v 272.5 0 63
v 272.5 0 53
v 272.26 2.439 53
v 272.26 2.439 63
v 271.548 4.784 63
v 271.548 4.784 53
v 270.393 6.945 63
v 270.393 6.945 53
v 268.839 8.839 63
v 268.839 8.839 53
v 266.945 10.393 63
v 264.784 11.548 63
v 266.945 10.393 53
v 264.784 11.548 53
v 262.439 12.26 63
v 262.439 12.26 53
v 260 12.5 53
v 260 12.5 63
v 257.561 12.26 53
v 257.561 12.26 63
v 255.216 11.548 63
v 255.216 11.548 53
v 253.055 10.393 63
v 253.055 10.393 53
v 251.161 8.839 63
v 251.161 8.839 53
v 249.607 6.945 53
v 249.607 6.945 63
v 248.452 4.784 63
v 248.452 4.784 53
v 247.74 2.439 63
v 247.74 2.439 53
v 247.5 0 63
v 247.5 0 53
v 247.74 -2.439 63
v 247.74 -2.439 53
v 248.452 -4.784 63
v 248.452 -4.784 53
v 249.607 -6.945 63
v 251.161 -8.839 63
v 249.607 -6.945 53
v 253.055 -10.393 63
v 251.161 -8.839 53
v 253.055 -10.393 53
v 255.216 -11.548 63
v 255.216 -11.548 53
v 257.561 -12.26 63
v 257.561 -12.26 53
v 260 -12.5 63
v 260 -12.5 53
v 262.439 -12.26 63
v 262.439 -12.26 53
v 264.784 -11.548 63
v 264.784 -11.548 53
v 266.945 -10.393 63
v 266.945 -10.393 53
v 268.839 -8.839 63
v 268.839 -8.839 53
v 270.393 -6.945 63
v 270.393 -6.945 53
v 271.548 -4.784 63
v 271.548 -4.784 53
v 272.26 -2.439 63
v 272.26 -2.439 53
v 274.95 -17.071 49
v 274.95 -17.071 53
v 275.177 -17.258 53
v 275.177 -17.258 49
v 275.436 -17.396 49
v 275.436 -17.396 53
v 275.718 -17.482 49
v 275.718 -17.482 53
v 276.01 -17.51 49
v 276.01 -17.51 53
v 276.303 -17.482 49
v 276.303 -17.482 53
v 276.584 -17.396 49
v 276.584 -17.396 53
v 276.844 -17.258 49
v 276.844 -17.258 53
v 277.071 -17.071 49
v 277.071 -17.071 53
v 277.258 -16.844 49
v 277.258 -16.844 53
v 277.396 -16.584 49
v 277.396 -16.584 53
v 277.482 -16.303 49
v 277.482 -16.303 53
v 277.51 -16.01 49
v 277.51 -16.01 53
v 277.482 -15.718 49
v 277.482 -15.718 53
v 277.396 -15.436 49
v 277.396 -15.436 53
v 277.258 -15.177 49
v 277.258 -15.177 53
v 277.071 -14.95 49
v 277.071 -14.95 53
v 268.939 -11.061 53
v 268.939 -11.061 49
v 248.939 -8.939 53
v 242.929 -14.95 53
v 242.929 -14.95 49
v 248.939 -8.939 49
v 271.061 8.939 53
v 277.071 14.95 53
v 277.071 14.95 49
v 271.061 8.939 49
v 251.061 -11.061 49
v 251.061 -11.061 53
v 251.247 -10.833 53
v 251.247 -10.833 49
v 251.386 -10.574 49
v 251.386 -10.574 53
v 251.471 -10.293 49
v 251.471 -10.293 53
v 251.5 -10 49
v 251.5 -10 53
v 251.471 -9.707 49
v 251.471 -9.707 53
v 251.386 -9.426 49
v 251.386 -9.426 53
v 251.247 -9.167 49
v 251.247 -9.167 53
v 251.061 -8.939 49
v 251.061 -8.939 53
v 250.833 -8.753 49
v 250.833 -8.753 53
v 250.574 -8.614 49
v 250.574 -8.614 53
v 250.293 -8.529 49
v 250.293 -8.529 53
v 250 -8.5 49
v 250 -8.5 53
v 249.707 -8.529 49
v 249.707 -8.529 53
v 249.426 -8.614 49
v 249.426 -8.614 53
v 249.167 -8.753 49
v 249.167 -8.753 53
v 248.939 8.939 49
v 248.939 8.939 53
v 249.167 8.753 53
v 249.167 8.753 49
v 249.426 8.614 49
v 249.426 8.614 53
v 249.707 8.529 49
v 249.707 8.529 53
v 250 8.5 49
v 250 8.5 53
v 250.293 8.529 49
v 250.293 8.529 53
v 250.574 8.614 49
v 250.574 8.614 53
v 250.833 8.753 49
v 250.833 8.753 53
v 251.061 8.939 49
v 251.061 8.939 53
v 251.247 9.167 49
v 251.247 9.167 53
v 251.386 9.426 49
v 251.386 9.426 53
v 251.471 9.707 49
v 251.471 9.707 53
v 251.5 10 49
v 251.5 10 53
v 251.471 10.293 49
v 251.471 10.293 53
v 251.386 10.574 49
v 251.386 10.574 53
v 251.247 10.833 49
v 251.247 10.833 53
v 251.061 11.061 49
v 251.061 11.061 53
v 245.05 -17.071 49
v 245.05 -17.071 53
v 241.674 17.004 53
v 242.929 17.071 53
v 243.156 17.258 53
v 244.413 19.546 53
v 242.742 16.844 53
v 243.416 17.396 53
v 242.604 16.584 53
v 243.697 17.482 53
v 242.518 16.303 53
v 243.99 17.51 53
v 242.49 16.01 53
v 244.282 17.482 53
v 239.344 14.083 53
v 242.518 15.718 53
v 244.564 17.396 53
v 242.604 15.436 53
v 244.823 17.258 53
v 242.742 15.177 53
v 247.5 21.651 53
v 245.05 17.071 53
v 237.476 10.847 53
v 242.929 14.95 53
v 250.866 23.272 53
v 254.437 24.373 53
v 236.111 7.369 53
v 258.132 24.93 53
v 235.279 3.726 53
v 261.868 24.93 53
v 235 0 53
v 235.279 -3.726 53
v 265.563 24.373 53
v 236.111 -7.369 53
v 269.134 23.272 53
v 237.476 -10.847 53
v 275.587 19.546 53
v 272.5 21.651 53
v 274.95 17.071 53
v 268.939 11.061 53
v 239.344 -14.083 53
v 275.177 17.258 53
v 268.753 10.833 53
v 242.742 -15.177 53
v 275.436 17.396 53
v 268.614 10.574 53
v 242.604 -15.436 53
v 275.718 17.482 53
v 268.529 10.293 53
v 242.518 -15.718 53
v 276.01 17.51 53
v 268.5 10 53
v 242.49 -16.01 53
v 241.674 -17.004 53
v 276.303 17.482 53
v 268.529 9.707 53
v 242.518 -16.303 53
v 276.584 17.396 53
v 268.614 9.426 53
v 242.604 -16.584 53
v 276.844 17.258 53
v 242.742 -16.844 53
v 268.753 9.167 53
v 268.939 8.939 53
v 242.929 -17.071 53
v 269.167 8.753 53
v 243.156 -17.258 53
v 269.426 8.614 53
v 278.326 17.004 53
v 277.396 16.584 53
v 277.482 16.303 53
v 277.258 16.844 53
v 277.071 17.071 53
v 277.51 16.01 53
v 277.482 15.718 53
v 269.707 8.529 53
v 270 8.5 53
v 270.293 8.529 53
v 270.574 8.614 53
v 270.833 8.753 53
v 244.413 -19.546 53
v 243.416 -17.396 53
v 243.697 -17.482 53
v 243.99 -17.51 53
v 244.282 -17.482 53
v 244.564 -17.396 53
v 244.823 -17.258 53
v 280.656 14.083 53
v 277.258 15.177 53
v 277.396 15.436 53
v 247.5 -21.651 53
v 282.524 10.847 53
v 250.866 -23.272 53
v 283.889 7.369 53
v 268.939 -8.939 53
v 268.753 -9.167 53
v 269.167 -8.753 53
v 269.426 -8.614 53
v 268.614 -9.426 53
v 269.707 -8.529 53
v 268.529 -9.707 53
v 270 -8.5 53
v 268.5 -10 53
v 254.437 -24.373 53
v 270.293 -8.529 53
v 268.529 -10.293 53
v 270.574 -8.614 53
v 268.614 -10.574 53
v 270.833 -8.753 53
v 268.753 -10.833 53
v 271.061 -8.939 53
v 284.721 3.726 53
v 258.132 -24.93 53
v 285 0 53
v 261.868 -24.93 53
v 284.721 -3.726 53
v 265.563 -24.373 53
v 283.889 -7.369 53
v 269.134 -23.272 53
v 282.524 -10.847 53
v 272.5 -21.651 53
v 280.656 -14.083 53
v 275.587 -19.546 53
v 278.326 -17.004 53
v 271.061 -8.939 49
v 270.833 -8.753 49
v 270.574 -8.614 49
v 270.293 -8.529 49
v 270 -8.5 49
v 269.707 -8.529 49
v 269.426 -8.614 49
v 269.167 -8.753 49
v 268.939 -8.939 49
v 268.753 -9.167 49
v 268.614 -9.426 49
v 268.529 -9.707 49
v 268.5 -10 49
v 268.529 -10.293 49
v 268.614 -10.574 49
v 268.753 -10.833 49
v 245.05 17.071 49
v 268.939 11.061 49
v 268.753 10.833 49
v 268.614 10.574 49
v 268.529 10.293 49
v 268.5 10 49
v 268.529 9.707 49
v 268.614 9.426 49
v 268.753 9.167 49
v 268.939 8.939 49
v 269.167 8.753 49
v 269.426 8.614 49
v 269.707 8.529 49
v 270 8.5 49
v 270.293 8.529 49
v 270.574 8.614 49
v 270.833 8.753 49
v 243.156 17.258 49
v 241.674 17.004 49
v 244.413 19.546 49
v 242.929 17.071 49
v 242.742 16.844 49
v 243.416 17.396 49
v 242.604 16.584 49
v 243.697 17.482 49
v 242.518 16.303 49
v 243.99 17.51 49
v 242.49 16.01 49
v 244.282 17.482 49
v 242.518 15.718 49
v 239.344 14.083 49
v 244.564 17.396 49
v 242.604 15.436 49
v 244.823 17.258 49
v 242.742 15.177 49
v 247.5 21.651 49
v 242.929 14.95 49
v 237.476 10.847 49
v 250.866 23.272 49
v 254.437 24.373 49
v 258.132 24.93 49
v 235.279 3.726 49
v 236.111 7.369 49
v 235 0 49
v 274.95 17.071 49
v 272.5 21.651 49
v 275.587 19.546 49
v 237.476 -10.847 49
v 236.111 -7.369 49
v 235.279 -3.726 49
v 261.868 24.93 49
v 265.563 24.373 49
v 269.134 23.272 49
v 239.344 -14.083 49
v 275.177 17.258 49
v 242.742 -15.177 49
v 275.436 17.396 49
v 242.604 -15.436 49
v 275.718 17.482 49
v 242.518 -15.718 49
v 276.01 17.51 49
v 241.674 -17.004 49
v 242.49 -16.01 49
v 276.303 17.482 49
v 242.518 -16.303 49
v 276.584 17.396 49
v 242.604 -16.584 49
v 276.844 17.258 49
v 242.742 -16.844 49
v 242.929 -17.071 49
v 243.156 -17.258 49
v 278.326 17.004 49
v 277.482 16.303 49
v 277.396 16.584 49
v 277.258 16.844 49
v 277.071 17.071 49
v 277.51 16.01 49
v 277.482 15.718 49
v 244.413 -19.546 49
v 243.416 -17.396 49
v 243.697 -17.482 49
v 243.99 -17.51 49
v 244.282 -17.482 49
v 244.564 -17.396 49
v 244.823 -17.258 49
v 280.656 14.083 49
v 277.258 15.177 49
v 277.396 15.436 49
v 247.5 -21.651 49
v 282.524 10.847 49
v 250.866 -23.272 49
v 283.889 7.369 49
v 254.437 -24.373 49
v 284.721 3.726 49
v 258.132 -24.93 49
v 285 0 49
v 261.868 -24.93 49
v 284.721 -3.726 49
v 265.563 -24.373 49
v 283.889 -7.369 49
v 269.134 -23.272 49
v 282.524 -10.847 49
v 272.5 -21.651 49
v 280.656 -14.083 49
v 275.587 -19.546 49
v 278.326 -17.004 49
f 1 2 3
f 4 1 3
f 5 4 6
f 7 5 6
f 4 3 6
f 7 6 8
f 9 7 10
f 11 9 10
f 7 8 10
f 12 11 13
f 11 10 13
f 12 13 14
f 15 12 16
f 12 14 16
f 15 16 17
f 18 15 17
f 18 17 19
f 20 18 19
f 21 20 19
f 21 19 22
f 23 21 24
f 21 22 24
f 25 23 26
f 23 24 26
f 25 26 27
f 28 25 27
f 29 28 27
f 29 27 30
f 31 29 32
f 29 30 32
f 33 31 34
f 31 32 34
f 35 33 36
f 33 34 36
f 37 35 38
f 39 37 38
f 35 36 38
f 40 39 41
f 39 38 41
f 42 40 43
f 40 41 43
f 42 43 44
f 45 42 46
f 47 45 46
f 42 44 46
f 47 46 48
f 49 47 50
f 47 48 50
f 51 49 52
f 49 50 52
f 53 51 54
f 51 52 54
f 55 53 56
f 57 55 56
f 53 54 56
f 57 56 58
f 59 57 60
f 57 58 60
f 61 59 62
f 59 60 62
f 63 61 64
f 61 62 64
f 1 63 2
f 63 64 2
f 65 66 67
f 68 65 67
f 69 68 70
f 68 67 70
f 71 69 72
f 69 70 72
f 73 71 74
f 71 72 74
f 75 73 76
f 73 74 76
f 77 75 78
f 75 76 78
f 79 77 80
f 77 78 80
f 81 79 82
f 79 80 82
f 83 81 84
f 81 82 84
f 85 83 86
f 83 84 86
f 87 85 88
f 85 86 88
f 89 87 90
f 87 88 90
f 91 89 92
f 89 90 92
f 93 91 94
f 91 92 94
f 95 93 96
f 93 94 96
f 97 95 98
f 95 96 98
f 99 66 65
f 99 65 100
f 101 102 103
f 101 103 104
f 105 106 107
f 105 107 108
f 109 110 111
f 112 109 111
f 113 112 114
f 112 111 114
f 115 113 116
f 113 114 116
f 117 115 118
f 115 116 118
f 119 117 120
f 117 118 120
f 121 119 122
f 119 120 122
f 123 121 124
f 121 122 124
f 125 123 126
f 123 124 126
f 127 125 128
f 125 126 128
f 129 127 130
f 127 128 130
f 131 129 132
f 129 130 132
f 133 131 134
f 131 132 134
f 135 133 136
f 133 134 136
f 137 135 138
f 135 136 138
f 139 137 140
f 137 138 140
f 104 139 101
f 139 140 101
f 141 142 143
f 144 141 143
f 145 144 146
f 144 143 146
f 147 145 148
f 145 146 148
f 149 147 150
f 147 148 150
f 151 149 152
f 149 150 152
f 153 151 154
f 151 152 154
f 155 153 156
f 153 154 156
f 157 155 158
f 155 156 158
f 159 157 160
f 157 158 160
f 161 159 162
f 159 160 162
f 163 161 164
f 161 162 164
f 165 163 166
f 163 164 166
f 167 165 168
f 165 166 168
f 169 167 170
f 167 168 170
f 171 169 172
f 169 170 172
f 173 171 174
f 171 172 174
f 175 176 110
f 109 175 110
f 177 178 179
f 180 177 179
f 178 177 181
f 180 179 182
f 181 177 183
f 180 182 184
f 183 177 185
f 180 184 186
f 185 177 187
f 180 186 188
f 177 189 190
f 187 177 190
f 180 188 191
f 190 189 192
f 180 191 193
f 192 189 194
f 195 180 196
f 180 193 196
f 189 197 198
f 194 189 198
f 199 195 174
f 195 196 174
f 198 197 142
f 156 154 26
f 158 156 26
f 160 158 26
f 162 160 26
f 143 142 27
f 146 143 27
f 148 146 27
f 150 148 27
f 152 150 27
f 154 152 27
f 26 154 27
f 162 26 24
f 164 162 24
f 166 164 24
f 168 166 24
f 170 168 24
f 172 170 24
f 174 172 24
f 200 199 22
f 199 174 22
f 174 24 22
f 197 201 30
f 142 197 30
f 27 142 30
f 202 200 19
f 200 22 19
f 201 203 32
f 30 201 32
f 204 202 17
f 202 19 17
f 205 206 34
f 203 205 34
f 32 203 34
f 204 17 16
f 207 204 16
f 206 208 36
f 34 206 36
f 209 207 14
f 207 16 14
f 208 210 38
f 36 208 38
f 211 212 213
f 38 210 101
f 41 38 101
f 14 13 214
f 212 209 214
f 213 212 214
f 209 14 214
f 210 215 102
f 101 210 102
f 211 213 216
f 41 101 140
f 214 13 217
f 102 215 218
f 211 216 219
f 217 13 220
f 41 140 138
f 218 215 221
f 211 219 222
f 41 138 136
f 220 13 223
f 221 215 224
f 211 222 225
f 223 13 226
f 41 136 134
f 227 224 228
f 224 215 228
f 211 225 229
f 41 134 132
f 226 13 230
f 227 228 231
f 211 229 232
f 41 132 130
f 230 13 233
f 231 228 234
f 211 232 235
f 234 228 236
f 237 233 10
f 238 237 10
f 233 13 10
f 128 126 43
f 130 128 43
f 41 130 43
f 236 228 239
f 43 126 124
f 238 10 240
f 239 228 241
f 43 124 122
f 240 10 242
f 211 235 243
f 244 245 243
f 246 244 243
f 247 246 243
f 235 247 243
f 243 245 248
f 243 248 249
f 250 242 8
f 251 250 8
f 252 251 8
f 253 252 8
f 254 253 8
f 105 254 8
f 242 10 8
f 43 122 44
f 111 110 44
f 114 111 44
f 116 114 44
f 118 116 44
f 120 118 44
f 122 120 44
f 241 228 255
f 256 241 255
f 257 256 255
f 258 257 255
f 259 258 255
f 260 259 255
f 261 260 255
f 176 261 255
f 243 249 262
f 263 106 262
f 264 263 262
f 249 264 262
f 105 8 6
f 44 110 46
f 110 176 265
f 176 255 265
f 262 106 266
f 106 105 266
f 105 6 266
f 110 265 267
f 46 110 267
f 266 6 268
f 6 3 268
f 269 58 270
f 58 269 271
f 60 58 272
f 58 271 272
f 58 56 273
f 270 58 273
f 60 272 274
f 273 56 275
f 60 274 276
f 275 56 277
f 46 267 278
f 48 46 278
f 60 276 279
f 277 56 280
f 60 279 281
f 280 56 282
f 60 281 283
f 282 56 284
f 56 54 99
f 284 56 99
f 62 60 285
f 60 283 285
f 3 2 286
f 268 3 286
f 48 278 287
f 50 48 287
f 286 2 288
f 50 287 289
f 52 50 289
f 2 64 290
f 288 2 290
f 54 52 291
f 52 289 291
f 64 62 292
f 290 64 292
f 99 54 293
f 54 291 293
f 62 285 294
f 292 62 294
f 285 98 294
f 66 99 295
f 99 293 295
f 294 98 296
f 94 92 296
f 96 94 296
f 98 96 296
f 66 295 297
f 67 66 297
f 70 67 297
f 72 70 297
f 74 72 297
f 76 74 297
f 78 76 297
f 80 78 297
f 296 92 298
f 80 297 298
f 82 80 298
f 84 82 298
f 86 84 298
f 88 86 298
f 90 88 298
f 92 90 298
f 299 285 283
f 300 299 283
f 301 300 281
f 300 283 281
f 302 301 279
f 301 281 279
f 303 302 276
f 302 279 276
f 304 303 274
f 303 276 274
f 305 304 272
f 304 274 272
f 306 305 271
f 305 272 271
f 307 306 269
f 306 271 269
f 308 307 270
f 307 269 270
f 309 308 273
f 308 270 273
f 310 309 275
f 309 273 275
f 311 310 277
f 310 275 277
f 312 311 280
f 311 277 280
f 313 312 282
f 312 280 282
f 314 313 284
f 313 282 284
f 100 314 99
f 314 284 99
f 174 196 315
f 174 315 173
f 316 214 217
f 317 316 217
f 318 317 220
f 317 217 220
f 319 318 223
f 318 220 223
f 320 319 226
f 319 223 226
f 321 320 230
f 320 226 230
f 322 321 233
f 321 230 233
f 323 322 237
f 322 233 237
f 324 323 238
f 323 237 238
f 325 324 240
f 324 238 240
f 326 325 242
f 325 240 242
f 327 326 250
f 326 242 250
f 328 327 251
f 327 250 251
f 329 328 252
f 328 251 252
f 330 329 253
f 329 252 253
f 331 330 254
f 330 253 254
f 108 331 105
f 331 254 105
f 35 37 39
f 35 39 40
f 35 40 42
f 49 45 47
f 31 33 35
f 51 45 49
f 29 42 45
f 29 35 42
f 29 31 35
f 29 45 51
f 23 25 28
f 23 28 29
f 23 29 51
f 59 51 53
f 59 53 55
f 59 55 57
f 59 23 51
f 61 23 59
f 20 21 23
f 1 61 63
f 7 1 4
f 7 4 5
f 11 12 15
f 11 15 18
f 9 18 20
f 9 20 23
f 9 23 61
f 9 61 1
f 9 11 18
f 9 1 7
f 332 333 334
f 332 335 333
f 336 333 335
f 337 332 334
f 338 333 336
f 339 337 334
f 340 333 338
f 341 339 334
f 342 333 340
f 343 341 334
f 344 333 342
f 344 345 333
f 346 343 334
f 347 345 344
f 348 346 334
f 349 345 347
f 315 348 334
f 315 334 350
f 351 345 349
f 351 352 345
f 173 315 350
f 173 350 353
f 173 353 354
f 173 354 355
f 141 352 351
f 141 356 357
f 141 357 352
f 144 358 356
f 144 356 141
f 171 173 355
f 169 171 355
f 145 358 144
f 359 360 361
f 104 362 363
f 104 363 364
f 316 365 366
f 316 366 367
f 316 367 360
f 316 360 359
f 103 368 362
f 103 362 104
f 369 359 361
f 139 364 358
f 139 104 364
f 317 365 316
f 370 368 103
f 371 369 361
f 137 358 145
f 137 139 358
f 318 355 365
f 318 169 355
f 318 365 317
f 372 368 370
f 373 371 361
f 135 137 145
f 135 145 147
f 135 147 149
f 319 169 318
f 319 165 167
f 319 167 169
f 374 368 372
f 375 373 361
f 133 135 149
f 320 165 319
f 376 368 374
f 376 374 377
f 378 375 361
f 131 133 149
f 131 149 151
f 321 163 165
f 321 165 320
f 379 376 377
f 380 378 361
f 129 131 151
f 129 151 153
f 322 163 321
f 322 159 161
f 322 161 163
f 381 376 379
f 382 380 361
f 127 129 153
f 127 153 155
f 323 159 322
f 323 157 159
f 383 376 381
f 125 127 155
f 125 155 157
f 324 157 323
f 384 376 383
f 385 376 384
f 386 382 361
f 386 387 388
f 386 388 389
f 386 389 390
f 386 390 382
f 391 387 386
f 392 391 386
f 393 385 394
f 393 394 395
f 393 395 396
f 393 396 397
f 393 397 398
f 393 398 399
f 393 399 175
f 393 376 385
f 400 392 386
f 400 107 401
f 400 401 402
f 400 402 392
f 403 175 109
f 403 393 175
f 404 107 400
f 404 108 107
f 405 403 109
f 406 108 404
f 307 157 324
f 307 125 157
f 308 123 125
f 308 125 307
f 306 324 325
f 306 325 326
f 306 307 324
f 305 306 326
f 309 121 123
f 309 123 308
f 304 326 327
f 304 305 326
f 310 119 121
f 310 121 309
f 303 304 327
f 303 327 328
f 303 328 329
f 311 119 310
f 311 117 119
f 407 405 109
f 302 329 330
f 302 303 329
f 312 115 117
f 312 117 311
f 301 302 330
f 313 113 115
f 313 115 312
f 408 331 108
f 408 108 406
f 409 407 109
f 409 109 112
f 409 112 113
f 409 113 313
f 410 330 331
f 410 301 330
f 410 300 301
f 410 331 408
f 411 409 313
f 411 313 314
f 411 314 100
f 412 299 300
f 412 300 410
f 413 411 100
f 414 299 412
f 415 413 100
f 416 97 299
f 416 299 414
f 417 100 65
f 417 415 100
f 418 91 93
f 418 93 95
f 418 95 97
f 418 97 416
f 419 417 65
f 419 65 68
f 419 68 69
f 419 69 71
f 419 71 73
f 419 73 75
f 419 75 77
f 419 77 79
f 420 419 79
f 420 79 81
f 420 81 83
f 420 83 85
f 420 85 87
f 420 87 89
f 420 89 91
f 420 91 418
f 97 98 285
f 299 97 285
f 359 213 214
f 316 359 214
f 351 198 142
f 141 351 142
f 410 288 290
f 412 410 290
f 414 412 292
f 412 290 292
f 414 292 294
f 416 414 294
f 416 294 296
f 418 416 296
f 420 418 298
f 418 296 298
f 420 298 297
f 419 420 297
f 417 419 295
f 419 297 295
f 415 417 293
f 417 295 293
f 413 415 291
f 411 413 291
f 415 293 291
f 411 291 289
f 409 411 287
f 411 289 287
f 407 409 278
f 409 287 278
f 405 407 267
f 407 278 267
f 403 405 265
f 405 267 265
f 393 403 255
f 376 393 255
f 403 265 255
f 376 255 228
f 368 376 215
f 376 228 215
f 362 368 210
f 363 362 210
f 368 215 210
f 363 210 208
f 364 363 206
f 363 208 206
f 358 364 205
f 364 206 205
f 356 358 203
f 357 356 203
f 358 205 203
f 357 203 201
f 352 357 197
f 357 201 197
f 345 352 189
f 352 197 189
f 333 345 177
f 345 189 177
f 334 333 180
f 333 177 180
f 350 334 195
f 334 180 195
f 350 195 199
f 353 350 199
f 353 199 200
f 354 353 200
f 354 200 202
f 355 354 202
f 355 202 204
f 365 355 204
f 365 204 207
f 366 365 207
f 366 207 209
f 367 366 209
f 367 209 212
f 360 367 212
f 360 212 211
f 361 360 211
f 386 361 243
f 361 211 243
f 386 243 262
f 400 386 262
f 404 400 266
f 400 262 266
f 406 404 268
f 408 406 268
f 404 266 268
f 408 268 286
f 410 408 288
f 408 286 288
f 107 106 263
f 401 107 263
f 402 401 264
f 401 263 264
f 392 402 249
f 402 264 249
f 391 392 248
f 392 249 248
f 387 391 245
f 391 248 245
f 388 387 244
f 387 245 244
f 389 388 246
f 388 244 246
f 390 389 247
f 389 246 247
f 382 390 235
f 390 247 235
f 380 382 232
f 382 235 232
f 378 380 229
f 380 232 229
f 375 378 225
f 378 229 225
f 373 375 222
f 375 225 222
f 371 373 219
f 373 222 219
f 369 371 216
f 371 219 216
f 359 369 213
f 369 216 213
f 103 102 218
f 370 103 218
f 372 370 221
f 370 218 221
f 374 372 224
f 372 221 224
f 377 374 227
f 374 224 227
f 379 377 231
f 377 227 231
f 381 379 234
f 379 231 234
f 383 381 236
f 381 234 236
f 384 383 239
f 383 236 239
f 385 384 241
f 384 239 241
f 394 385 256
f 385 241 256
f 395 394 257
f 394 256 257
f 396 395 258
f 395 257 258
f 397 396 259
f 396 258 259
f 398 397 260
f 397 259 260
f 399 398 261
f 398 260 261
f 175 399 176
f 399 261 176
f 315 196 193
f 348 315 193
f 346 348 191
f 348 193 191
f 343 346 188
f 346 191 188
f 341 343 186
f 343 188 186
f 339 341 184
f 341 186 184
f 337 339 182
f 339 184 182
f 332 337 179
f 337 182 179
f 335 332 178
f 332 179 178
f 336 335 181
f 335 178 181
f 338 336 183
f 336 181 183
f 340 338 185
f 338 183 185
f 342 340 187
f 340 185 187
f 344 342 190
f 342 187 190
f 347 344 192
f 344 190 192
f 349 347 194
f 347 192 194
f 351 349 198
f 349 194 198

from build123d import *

# Parameters (mm, degrees)
SKETCH076_R           = 12.5
PAD031_DEPTH          = 10
SKETCH077_R           = 25
PAD032_DEPTH          = 4
POCKET030_DEPTH       = 5
POLARPATTERN005_COUNT = 4


with BuildPart() as part:
    # Sketch076 → Pad031 (new body)
    with BuildSketch(Plane.XY):
        Circle(SKETCH076_R)
    extrude(amount=PAD031_DEPTH)

    # Sketch077 (on Face2 of Pad031) → Pad032 (join)
    with BuildSketch(Plane(origin=(0, 0, 0), x_dir=(1, 0, 0), z_dir=(0, 0, -1))):
        Circle(SKETCH077_R)
    extrude(amount=PAD032_DEPTH)

    # Sketch078 (on Face2 of Pad032) → Pocket030 (cut)
    with BuildSketch(Plane.XY):
        with BuildLine():
            ThreePointArc((-14.949749, 17.071067), (-17.071069, 17.071067), (-17.071069, 14.949746))
            Line((-17.071069, 14.949746), (-11.06066, 8.93934))
            ThreePointArc((-11.06066, 8.93934), (-8.93934, 8.93934), (-8.93934, 11.06066))
            Line((-14.949749, 17.071067), (-8.93934, 11.06066))
        make_face()
    pocket030 = extrude(amount=-POCKET030_DEPTH, mode=Mode.SUBTRACT)

    # PolarPattern005: Pocket030 ×4 about axis
    polarpattern005_axis = Axis((0, 0, 0), (0, 0, 1))
    for i in range(1, POLARPATTERN005_COUNT):
        add(pocket030.rotate(polarpattern005_axis, i * 360 / POLARPATTERN005_COUNT), mode=Mode.SUBTRACT)


with BuildPart() as part_1:
    # Body006 placement: moved
    add(part.part.moved(Location((260, 0, 53))))


solid = part_1.part
